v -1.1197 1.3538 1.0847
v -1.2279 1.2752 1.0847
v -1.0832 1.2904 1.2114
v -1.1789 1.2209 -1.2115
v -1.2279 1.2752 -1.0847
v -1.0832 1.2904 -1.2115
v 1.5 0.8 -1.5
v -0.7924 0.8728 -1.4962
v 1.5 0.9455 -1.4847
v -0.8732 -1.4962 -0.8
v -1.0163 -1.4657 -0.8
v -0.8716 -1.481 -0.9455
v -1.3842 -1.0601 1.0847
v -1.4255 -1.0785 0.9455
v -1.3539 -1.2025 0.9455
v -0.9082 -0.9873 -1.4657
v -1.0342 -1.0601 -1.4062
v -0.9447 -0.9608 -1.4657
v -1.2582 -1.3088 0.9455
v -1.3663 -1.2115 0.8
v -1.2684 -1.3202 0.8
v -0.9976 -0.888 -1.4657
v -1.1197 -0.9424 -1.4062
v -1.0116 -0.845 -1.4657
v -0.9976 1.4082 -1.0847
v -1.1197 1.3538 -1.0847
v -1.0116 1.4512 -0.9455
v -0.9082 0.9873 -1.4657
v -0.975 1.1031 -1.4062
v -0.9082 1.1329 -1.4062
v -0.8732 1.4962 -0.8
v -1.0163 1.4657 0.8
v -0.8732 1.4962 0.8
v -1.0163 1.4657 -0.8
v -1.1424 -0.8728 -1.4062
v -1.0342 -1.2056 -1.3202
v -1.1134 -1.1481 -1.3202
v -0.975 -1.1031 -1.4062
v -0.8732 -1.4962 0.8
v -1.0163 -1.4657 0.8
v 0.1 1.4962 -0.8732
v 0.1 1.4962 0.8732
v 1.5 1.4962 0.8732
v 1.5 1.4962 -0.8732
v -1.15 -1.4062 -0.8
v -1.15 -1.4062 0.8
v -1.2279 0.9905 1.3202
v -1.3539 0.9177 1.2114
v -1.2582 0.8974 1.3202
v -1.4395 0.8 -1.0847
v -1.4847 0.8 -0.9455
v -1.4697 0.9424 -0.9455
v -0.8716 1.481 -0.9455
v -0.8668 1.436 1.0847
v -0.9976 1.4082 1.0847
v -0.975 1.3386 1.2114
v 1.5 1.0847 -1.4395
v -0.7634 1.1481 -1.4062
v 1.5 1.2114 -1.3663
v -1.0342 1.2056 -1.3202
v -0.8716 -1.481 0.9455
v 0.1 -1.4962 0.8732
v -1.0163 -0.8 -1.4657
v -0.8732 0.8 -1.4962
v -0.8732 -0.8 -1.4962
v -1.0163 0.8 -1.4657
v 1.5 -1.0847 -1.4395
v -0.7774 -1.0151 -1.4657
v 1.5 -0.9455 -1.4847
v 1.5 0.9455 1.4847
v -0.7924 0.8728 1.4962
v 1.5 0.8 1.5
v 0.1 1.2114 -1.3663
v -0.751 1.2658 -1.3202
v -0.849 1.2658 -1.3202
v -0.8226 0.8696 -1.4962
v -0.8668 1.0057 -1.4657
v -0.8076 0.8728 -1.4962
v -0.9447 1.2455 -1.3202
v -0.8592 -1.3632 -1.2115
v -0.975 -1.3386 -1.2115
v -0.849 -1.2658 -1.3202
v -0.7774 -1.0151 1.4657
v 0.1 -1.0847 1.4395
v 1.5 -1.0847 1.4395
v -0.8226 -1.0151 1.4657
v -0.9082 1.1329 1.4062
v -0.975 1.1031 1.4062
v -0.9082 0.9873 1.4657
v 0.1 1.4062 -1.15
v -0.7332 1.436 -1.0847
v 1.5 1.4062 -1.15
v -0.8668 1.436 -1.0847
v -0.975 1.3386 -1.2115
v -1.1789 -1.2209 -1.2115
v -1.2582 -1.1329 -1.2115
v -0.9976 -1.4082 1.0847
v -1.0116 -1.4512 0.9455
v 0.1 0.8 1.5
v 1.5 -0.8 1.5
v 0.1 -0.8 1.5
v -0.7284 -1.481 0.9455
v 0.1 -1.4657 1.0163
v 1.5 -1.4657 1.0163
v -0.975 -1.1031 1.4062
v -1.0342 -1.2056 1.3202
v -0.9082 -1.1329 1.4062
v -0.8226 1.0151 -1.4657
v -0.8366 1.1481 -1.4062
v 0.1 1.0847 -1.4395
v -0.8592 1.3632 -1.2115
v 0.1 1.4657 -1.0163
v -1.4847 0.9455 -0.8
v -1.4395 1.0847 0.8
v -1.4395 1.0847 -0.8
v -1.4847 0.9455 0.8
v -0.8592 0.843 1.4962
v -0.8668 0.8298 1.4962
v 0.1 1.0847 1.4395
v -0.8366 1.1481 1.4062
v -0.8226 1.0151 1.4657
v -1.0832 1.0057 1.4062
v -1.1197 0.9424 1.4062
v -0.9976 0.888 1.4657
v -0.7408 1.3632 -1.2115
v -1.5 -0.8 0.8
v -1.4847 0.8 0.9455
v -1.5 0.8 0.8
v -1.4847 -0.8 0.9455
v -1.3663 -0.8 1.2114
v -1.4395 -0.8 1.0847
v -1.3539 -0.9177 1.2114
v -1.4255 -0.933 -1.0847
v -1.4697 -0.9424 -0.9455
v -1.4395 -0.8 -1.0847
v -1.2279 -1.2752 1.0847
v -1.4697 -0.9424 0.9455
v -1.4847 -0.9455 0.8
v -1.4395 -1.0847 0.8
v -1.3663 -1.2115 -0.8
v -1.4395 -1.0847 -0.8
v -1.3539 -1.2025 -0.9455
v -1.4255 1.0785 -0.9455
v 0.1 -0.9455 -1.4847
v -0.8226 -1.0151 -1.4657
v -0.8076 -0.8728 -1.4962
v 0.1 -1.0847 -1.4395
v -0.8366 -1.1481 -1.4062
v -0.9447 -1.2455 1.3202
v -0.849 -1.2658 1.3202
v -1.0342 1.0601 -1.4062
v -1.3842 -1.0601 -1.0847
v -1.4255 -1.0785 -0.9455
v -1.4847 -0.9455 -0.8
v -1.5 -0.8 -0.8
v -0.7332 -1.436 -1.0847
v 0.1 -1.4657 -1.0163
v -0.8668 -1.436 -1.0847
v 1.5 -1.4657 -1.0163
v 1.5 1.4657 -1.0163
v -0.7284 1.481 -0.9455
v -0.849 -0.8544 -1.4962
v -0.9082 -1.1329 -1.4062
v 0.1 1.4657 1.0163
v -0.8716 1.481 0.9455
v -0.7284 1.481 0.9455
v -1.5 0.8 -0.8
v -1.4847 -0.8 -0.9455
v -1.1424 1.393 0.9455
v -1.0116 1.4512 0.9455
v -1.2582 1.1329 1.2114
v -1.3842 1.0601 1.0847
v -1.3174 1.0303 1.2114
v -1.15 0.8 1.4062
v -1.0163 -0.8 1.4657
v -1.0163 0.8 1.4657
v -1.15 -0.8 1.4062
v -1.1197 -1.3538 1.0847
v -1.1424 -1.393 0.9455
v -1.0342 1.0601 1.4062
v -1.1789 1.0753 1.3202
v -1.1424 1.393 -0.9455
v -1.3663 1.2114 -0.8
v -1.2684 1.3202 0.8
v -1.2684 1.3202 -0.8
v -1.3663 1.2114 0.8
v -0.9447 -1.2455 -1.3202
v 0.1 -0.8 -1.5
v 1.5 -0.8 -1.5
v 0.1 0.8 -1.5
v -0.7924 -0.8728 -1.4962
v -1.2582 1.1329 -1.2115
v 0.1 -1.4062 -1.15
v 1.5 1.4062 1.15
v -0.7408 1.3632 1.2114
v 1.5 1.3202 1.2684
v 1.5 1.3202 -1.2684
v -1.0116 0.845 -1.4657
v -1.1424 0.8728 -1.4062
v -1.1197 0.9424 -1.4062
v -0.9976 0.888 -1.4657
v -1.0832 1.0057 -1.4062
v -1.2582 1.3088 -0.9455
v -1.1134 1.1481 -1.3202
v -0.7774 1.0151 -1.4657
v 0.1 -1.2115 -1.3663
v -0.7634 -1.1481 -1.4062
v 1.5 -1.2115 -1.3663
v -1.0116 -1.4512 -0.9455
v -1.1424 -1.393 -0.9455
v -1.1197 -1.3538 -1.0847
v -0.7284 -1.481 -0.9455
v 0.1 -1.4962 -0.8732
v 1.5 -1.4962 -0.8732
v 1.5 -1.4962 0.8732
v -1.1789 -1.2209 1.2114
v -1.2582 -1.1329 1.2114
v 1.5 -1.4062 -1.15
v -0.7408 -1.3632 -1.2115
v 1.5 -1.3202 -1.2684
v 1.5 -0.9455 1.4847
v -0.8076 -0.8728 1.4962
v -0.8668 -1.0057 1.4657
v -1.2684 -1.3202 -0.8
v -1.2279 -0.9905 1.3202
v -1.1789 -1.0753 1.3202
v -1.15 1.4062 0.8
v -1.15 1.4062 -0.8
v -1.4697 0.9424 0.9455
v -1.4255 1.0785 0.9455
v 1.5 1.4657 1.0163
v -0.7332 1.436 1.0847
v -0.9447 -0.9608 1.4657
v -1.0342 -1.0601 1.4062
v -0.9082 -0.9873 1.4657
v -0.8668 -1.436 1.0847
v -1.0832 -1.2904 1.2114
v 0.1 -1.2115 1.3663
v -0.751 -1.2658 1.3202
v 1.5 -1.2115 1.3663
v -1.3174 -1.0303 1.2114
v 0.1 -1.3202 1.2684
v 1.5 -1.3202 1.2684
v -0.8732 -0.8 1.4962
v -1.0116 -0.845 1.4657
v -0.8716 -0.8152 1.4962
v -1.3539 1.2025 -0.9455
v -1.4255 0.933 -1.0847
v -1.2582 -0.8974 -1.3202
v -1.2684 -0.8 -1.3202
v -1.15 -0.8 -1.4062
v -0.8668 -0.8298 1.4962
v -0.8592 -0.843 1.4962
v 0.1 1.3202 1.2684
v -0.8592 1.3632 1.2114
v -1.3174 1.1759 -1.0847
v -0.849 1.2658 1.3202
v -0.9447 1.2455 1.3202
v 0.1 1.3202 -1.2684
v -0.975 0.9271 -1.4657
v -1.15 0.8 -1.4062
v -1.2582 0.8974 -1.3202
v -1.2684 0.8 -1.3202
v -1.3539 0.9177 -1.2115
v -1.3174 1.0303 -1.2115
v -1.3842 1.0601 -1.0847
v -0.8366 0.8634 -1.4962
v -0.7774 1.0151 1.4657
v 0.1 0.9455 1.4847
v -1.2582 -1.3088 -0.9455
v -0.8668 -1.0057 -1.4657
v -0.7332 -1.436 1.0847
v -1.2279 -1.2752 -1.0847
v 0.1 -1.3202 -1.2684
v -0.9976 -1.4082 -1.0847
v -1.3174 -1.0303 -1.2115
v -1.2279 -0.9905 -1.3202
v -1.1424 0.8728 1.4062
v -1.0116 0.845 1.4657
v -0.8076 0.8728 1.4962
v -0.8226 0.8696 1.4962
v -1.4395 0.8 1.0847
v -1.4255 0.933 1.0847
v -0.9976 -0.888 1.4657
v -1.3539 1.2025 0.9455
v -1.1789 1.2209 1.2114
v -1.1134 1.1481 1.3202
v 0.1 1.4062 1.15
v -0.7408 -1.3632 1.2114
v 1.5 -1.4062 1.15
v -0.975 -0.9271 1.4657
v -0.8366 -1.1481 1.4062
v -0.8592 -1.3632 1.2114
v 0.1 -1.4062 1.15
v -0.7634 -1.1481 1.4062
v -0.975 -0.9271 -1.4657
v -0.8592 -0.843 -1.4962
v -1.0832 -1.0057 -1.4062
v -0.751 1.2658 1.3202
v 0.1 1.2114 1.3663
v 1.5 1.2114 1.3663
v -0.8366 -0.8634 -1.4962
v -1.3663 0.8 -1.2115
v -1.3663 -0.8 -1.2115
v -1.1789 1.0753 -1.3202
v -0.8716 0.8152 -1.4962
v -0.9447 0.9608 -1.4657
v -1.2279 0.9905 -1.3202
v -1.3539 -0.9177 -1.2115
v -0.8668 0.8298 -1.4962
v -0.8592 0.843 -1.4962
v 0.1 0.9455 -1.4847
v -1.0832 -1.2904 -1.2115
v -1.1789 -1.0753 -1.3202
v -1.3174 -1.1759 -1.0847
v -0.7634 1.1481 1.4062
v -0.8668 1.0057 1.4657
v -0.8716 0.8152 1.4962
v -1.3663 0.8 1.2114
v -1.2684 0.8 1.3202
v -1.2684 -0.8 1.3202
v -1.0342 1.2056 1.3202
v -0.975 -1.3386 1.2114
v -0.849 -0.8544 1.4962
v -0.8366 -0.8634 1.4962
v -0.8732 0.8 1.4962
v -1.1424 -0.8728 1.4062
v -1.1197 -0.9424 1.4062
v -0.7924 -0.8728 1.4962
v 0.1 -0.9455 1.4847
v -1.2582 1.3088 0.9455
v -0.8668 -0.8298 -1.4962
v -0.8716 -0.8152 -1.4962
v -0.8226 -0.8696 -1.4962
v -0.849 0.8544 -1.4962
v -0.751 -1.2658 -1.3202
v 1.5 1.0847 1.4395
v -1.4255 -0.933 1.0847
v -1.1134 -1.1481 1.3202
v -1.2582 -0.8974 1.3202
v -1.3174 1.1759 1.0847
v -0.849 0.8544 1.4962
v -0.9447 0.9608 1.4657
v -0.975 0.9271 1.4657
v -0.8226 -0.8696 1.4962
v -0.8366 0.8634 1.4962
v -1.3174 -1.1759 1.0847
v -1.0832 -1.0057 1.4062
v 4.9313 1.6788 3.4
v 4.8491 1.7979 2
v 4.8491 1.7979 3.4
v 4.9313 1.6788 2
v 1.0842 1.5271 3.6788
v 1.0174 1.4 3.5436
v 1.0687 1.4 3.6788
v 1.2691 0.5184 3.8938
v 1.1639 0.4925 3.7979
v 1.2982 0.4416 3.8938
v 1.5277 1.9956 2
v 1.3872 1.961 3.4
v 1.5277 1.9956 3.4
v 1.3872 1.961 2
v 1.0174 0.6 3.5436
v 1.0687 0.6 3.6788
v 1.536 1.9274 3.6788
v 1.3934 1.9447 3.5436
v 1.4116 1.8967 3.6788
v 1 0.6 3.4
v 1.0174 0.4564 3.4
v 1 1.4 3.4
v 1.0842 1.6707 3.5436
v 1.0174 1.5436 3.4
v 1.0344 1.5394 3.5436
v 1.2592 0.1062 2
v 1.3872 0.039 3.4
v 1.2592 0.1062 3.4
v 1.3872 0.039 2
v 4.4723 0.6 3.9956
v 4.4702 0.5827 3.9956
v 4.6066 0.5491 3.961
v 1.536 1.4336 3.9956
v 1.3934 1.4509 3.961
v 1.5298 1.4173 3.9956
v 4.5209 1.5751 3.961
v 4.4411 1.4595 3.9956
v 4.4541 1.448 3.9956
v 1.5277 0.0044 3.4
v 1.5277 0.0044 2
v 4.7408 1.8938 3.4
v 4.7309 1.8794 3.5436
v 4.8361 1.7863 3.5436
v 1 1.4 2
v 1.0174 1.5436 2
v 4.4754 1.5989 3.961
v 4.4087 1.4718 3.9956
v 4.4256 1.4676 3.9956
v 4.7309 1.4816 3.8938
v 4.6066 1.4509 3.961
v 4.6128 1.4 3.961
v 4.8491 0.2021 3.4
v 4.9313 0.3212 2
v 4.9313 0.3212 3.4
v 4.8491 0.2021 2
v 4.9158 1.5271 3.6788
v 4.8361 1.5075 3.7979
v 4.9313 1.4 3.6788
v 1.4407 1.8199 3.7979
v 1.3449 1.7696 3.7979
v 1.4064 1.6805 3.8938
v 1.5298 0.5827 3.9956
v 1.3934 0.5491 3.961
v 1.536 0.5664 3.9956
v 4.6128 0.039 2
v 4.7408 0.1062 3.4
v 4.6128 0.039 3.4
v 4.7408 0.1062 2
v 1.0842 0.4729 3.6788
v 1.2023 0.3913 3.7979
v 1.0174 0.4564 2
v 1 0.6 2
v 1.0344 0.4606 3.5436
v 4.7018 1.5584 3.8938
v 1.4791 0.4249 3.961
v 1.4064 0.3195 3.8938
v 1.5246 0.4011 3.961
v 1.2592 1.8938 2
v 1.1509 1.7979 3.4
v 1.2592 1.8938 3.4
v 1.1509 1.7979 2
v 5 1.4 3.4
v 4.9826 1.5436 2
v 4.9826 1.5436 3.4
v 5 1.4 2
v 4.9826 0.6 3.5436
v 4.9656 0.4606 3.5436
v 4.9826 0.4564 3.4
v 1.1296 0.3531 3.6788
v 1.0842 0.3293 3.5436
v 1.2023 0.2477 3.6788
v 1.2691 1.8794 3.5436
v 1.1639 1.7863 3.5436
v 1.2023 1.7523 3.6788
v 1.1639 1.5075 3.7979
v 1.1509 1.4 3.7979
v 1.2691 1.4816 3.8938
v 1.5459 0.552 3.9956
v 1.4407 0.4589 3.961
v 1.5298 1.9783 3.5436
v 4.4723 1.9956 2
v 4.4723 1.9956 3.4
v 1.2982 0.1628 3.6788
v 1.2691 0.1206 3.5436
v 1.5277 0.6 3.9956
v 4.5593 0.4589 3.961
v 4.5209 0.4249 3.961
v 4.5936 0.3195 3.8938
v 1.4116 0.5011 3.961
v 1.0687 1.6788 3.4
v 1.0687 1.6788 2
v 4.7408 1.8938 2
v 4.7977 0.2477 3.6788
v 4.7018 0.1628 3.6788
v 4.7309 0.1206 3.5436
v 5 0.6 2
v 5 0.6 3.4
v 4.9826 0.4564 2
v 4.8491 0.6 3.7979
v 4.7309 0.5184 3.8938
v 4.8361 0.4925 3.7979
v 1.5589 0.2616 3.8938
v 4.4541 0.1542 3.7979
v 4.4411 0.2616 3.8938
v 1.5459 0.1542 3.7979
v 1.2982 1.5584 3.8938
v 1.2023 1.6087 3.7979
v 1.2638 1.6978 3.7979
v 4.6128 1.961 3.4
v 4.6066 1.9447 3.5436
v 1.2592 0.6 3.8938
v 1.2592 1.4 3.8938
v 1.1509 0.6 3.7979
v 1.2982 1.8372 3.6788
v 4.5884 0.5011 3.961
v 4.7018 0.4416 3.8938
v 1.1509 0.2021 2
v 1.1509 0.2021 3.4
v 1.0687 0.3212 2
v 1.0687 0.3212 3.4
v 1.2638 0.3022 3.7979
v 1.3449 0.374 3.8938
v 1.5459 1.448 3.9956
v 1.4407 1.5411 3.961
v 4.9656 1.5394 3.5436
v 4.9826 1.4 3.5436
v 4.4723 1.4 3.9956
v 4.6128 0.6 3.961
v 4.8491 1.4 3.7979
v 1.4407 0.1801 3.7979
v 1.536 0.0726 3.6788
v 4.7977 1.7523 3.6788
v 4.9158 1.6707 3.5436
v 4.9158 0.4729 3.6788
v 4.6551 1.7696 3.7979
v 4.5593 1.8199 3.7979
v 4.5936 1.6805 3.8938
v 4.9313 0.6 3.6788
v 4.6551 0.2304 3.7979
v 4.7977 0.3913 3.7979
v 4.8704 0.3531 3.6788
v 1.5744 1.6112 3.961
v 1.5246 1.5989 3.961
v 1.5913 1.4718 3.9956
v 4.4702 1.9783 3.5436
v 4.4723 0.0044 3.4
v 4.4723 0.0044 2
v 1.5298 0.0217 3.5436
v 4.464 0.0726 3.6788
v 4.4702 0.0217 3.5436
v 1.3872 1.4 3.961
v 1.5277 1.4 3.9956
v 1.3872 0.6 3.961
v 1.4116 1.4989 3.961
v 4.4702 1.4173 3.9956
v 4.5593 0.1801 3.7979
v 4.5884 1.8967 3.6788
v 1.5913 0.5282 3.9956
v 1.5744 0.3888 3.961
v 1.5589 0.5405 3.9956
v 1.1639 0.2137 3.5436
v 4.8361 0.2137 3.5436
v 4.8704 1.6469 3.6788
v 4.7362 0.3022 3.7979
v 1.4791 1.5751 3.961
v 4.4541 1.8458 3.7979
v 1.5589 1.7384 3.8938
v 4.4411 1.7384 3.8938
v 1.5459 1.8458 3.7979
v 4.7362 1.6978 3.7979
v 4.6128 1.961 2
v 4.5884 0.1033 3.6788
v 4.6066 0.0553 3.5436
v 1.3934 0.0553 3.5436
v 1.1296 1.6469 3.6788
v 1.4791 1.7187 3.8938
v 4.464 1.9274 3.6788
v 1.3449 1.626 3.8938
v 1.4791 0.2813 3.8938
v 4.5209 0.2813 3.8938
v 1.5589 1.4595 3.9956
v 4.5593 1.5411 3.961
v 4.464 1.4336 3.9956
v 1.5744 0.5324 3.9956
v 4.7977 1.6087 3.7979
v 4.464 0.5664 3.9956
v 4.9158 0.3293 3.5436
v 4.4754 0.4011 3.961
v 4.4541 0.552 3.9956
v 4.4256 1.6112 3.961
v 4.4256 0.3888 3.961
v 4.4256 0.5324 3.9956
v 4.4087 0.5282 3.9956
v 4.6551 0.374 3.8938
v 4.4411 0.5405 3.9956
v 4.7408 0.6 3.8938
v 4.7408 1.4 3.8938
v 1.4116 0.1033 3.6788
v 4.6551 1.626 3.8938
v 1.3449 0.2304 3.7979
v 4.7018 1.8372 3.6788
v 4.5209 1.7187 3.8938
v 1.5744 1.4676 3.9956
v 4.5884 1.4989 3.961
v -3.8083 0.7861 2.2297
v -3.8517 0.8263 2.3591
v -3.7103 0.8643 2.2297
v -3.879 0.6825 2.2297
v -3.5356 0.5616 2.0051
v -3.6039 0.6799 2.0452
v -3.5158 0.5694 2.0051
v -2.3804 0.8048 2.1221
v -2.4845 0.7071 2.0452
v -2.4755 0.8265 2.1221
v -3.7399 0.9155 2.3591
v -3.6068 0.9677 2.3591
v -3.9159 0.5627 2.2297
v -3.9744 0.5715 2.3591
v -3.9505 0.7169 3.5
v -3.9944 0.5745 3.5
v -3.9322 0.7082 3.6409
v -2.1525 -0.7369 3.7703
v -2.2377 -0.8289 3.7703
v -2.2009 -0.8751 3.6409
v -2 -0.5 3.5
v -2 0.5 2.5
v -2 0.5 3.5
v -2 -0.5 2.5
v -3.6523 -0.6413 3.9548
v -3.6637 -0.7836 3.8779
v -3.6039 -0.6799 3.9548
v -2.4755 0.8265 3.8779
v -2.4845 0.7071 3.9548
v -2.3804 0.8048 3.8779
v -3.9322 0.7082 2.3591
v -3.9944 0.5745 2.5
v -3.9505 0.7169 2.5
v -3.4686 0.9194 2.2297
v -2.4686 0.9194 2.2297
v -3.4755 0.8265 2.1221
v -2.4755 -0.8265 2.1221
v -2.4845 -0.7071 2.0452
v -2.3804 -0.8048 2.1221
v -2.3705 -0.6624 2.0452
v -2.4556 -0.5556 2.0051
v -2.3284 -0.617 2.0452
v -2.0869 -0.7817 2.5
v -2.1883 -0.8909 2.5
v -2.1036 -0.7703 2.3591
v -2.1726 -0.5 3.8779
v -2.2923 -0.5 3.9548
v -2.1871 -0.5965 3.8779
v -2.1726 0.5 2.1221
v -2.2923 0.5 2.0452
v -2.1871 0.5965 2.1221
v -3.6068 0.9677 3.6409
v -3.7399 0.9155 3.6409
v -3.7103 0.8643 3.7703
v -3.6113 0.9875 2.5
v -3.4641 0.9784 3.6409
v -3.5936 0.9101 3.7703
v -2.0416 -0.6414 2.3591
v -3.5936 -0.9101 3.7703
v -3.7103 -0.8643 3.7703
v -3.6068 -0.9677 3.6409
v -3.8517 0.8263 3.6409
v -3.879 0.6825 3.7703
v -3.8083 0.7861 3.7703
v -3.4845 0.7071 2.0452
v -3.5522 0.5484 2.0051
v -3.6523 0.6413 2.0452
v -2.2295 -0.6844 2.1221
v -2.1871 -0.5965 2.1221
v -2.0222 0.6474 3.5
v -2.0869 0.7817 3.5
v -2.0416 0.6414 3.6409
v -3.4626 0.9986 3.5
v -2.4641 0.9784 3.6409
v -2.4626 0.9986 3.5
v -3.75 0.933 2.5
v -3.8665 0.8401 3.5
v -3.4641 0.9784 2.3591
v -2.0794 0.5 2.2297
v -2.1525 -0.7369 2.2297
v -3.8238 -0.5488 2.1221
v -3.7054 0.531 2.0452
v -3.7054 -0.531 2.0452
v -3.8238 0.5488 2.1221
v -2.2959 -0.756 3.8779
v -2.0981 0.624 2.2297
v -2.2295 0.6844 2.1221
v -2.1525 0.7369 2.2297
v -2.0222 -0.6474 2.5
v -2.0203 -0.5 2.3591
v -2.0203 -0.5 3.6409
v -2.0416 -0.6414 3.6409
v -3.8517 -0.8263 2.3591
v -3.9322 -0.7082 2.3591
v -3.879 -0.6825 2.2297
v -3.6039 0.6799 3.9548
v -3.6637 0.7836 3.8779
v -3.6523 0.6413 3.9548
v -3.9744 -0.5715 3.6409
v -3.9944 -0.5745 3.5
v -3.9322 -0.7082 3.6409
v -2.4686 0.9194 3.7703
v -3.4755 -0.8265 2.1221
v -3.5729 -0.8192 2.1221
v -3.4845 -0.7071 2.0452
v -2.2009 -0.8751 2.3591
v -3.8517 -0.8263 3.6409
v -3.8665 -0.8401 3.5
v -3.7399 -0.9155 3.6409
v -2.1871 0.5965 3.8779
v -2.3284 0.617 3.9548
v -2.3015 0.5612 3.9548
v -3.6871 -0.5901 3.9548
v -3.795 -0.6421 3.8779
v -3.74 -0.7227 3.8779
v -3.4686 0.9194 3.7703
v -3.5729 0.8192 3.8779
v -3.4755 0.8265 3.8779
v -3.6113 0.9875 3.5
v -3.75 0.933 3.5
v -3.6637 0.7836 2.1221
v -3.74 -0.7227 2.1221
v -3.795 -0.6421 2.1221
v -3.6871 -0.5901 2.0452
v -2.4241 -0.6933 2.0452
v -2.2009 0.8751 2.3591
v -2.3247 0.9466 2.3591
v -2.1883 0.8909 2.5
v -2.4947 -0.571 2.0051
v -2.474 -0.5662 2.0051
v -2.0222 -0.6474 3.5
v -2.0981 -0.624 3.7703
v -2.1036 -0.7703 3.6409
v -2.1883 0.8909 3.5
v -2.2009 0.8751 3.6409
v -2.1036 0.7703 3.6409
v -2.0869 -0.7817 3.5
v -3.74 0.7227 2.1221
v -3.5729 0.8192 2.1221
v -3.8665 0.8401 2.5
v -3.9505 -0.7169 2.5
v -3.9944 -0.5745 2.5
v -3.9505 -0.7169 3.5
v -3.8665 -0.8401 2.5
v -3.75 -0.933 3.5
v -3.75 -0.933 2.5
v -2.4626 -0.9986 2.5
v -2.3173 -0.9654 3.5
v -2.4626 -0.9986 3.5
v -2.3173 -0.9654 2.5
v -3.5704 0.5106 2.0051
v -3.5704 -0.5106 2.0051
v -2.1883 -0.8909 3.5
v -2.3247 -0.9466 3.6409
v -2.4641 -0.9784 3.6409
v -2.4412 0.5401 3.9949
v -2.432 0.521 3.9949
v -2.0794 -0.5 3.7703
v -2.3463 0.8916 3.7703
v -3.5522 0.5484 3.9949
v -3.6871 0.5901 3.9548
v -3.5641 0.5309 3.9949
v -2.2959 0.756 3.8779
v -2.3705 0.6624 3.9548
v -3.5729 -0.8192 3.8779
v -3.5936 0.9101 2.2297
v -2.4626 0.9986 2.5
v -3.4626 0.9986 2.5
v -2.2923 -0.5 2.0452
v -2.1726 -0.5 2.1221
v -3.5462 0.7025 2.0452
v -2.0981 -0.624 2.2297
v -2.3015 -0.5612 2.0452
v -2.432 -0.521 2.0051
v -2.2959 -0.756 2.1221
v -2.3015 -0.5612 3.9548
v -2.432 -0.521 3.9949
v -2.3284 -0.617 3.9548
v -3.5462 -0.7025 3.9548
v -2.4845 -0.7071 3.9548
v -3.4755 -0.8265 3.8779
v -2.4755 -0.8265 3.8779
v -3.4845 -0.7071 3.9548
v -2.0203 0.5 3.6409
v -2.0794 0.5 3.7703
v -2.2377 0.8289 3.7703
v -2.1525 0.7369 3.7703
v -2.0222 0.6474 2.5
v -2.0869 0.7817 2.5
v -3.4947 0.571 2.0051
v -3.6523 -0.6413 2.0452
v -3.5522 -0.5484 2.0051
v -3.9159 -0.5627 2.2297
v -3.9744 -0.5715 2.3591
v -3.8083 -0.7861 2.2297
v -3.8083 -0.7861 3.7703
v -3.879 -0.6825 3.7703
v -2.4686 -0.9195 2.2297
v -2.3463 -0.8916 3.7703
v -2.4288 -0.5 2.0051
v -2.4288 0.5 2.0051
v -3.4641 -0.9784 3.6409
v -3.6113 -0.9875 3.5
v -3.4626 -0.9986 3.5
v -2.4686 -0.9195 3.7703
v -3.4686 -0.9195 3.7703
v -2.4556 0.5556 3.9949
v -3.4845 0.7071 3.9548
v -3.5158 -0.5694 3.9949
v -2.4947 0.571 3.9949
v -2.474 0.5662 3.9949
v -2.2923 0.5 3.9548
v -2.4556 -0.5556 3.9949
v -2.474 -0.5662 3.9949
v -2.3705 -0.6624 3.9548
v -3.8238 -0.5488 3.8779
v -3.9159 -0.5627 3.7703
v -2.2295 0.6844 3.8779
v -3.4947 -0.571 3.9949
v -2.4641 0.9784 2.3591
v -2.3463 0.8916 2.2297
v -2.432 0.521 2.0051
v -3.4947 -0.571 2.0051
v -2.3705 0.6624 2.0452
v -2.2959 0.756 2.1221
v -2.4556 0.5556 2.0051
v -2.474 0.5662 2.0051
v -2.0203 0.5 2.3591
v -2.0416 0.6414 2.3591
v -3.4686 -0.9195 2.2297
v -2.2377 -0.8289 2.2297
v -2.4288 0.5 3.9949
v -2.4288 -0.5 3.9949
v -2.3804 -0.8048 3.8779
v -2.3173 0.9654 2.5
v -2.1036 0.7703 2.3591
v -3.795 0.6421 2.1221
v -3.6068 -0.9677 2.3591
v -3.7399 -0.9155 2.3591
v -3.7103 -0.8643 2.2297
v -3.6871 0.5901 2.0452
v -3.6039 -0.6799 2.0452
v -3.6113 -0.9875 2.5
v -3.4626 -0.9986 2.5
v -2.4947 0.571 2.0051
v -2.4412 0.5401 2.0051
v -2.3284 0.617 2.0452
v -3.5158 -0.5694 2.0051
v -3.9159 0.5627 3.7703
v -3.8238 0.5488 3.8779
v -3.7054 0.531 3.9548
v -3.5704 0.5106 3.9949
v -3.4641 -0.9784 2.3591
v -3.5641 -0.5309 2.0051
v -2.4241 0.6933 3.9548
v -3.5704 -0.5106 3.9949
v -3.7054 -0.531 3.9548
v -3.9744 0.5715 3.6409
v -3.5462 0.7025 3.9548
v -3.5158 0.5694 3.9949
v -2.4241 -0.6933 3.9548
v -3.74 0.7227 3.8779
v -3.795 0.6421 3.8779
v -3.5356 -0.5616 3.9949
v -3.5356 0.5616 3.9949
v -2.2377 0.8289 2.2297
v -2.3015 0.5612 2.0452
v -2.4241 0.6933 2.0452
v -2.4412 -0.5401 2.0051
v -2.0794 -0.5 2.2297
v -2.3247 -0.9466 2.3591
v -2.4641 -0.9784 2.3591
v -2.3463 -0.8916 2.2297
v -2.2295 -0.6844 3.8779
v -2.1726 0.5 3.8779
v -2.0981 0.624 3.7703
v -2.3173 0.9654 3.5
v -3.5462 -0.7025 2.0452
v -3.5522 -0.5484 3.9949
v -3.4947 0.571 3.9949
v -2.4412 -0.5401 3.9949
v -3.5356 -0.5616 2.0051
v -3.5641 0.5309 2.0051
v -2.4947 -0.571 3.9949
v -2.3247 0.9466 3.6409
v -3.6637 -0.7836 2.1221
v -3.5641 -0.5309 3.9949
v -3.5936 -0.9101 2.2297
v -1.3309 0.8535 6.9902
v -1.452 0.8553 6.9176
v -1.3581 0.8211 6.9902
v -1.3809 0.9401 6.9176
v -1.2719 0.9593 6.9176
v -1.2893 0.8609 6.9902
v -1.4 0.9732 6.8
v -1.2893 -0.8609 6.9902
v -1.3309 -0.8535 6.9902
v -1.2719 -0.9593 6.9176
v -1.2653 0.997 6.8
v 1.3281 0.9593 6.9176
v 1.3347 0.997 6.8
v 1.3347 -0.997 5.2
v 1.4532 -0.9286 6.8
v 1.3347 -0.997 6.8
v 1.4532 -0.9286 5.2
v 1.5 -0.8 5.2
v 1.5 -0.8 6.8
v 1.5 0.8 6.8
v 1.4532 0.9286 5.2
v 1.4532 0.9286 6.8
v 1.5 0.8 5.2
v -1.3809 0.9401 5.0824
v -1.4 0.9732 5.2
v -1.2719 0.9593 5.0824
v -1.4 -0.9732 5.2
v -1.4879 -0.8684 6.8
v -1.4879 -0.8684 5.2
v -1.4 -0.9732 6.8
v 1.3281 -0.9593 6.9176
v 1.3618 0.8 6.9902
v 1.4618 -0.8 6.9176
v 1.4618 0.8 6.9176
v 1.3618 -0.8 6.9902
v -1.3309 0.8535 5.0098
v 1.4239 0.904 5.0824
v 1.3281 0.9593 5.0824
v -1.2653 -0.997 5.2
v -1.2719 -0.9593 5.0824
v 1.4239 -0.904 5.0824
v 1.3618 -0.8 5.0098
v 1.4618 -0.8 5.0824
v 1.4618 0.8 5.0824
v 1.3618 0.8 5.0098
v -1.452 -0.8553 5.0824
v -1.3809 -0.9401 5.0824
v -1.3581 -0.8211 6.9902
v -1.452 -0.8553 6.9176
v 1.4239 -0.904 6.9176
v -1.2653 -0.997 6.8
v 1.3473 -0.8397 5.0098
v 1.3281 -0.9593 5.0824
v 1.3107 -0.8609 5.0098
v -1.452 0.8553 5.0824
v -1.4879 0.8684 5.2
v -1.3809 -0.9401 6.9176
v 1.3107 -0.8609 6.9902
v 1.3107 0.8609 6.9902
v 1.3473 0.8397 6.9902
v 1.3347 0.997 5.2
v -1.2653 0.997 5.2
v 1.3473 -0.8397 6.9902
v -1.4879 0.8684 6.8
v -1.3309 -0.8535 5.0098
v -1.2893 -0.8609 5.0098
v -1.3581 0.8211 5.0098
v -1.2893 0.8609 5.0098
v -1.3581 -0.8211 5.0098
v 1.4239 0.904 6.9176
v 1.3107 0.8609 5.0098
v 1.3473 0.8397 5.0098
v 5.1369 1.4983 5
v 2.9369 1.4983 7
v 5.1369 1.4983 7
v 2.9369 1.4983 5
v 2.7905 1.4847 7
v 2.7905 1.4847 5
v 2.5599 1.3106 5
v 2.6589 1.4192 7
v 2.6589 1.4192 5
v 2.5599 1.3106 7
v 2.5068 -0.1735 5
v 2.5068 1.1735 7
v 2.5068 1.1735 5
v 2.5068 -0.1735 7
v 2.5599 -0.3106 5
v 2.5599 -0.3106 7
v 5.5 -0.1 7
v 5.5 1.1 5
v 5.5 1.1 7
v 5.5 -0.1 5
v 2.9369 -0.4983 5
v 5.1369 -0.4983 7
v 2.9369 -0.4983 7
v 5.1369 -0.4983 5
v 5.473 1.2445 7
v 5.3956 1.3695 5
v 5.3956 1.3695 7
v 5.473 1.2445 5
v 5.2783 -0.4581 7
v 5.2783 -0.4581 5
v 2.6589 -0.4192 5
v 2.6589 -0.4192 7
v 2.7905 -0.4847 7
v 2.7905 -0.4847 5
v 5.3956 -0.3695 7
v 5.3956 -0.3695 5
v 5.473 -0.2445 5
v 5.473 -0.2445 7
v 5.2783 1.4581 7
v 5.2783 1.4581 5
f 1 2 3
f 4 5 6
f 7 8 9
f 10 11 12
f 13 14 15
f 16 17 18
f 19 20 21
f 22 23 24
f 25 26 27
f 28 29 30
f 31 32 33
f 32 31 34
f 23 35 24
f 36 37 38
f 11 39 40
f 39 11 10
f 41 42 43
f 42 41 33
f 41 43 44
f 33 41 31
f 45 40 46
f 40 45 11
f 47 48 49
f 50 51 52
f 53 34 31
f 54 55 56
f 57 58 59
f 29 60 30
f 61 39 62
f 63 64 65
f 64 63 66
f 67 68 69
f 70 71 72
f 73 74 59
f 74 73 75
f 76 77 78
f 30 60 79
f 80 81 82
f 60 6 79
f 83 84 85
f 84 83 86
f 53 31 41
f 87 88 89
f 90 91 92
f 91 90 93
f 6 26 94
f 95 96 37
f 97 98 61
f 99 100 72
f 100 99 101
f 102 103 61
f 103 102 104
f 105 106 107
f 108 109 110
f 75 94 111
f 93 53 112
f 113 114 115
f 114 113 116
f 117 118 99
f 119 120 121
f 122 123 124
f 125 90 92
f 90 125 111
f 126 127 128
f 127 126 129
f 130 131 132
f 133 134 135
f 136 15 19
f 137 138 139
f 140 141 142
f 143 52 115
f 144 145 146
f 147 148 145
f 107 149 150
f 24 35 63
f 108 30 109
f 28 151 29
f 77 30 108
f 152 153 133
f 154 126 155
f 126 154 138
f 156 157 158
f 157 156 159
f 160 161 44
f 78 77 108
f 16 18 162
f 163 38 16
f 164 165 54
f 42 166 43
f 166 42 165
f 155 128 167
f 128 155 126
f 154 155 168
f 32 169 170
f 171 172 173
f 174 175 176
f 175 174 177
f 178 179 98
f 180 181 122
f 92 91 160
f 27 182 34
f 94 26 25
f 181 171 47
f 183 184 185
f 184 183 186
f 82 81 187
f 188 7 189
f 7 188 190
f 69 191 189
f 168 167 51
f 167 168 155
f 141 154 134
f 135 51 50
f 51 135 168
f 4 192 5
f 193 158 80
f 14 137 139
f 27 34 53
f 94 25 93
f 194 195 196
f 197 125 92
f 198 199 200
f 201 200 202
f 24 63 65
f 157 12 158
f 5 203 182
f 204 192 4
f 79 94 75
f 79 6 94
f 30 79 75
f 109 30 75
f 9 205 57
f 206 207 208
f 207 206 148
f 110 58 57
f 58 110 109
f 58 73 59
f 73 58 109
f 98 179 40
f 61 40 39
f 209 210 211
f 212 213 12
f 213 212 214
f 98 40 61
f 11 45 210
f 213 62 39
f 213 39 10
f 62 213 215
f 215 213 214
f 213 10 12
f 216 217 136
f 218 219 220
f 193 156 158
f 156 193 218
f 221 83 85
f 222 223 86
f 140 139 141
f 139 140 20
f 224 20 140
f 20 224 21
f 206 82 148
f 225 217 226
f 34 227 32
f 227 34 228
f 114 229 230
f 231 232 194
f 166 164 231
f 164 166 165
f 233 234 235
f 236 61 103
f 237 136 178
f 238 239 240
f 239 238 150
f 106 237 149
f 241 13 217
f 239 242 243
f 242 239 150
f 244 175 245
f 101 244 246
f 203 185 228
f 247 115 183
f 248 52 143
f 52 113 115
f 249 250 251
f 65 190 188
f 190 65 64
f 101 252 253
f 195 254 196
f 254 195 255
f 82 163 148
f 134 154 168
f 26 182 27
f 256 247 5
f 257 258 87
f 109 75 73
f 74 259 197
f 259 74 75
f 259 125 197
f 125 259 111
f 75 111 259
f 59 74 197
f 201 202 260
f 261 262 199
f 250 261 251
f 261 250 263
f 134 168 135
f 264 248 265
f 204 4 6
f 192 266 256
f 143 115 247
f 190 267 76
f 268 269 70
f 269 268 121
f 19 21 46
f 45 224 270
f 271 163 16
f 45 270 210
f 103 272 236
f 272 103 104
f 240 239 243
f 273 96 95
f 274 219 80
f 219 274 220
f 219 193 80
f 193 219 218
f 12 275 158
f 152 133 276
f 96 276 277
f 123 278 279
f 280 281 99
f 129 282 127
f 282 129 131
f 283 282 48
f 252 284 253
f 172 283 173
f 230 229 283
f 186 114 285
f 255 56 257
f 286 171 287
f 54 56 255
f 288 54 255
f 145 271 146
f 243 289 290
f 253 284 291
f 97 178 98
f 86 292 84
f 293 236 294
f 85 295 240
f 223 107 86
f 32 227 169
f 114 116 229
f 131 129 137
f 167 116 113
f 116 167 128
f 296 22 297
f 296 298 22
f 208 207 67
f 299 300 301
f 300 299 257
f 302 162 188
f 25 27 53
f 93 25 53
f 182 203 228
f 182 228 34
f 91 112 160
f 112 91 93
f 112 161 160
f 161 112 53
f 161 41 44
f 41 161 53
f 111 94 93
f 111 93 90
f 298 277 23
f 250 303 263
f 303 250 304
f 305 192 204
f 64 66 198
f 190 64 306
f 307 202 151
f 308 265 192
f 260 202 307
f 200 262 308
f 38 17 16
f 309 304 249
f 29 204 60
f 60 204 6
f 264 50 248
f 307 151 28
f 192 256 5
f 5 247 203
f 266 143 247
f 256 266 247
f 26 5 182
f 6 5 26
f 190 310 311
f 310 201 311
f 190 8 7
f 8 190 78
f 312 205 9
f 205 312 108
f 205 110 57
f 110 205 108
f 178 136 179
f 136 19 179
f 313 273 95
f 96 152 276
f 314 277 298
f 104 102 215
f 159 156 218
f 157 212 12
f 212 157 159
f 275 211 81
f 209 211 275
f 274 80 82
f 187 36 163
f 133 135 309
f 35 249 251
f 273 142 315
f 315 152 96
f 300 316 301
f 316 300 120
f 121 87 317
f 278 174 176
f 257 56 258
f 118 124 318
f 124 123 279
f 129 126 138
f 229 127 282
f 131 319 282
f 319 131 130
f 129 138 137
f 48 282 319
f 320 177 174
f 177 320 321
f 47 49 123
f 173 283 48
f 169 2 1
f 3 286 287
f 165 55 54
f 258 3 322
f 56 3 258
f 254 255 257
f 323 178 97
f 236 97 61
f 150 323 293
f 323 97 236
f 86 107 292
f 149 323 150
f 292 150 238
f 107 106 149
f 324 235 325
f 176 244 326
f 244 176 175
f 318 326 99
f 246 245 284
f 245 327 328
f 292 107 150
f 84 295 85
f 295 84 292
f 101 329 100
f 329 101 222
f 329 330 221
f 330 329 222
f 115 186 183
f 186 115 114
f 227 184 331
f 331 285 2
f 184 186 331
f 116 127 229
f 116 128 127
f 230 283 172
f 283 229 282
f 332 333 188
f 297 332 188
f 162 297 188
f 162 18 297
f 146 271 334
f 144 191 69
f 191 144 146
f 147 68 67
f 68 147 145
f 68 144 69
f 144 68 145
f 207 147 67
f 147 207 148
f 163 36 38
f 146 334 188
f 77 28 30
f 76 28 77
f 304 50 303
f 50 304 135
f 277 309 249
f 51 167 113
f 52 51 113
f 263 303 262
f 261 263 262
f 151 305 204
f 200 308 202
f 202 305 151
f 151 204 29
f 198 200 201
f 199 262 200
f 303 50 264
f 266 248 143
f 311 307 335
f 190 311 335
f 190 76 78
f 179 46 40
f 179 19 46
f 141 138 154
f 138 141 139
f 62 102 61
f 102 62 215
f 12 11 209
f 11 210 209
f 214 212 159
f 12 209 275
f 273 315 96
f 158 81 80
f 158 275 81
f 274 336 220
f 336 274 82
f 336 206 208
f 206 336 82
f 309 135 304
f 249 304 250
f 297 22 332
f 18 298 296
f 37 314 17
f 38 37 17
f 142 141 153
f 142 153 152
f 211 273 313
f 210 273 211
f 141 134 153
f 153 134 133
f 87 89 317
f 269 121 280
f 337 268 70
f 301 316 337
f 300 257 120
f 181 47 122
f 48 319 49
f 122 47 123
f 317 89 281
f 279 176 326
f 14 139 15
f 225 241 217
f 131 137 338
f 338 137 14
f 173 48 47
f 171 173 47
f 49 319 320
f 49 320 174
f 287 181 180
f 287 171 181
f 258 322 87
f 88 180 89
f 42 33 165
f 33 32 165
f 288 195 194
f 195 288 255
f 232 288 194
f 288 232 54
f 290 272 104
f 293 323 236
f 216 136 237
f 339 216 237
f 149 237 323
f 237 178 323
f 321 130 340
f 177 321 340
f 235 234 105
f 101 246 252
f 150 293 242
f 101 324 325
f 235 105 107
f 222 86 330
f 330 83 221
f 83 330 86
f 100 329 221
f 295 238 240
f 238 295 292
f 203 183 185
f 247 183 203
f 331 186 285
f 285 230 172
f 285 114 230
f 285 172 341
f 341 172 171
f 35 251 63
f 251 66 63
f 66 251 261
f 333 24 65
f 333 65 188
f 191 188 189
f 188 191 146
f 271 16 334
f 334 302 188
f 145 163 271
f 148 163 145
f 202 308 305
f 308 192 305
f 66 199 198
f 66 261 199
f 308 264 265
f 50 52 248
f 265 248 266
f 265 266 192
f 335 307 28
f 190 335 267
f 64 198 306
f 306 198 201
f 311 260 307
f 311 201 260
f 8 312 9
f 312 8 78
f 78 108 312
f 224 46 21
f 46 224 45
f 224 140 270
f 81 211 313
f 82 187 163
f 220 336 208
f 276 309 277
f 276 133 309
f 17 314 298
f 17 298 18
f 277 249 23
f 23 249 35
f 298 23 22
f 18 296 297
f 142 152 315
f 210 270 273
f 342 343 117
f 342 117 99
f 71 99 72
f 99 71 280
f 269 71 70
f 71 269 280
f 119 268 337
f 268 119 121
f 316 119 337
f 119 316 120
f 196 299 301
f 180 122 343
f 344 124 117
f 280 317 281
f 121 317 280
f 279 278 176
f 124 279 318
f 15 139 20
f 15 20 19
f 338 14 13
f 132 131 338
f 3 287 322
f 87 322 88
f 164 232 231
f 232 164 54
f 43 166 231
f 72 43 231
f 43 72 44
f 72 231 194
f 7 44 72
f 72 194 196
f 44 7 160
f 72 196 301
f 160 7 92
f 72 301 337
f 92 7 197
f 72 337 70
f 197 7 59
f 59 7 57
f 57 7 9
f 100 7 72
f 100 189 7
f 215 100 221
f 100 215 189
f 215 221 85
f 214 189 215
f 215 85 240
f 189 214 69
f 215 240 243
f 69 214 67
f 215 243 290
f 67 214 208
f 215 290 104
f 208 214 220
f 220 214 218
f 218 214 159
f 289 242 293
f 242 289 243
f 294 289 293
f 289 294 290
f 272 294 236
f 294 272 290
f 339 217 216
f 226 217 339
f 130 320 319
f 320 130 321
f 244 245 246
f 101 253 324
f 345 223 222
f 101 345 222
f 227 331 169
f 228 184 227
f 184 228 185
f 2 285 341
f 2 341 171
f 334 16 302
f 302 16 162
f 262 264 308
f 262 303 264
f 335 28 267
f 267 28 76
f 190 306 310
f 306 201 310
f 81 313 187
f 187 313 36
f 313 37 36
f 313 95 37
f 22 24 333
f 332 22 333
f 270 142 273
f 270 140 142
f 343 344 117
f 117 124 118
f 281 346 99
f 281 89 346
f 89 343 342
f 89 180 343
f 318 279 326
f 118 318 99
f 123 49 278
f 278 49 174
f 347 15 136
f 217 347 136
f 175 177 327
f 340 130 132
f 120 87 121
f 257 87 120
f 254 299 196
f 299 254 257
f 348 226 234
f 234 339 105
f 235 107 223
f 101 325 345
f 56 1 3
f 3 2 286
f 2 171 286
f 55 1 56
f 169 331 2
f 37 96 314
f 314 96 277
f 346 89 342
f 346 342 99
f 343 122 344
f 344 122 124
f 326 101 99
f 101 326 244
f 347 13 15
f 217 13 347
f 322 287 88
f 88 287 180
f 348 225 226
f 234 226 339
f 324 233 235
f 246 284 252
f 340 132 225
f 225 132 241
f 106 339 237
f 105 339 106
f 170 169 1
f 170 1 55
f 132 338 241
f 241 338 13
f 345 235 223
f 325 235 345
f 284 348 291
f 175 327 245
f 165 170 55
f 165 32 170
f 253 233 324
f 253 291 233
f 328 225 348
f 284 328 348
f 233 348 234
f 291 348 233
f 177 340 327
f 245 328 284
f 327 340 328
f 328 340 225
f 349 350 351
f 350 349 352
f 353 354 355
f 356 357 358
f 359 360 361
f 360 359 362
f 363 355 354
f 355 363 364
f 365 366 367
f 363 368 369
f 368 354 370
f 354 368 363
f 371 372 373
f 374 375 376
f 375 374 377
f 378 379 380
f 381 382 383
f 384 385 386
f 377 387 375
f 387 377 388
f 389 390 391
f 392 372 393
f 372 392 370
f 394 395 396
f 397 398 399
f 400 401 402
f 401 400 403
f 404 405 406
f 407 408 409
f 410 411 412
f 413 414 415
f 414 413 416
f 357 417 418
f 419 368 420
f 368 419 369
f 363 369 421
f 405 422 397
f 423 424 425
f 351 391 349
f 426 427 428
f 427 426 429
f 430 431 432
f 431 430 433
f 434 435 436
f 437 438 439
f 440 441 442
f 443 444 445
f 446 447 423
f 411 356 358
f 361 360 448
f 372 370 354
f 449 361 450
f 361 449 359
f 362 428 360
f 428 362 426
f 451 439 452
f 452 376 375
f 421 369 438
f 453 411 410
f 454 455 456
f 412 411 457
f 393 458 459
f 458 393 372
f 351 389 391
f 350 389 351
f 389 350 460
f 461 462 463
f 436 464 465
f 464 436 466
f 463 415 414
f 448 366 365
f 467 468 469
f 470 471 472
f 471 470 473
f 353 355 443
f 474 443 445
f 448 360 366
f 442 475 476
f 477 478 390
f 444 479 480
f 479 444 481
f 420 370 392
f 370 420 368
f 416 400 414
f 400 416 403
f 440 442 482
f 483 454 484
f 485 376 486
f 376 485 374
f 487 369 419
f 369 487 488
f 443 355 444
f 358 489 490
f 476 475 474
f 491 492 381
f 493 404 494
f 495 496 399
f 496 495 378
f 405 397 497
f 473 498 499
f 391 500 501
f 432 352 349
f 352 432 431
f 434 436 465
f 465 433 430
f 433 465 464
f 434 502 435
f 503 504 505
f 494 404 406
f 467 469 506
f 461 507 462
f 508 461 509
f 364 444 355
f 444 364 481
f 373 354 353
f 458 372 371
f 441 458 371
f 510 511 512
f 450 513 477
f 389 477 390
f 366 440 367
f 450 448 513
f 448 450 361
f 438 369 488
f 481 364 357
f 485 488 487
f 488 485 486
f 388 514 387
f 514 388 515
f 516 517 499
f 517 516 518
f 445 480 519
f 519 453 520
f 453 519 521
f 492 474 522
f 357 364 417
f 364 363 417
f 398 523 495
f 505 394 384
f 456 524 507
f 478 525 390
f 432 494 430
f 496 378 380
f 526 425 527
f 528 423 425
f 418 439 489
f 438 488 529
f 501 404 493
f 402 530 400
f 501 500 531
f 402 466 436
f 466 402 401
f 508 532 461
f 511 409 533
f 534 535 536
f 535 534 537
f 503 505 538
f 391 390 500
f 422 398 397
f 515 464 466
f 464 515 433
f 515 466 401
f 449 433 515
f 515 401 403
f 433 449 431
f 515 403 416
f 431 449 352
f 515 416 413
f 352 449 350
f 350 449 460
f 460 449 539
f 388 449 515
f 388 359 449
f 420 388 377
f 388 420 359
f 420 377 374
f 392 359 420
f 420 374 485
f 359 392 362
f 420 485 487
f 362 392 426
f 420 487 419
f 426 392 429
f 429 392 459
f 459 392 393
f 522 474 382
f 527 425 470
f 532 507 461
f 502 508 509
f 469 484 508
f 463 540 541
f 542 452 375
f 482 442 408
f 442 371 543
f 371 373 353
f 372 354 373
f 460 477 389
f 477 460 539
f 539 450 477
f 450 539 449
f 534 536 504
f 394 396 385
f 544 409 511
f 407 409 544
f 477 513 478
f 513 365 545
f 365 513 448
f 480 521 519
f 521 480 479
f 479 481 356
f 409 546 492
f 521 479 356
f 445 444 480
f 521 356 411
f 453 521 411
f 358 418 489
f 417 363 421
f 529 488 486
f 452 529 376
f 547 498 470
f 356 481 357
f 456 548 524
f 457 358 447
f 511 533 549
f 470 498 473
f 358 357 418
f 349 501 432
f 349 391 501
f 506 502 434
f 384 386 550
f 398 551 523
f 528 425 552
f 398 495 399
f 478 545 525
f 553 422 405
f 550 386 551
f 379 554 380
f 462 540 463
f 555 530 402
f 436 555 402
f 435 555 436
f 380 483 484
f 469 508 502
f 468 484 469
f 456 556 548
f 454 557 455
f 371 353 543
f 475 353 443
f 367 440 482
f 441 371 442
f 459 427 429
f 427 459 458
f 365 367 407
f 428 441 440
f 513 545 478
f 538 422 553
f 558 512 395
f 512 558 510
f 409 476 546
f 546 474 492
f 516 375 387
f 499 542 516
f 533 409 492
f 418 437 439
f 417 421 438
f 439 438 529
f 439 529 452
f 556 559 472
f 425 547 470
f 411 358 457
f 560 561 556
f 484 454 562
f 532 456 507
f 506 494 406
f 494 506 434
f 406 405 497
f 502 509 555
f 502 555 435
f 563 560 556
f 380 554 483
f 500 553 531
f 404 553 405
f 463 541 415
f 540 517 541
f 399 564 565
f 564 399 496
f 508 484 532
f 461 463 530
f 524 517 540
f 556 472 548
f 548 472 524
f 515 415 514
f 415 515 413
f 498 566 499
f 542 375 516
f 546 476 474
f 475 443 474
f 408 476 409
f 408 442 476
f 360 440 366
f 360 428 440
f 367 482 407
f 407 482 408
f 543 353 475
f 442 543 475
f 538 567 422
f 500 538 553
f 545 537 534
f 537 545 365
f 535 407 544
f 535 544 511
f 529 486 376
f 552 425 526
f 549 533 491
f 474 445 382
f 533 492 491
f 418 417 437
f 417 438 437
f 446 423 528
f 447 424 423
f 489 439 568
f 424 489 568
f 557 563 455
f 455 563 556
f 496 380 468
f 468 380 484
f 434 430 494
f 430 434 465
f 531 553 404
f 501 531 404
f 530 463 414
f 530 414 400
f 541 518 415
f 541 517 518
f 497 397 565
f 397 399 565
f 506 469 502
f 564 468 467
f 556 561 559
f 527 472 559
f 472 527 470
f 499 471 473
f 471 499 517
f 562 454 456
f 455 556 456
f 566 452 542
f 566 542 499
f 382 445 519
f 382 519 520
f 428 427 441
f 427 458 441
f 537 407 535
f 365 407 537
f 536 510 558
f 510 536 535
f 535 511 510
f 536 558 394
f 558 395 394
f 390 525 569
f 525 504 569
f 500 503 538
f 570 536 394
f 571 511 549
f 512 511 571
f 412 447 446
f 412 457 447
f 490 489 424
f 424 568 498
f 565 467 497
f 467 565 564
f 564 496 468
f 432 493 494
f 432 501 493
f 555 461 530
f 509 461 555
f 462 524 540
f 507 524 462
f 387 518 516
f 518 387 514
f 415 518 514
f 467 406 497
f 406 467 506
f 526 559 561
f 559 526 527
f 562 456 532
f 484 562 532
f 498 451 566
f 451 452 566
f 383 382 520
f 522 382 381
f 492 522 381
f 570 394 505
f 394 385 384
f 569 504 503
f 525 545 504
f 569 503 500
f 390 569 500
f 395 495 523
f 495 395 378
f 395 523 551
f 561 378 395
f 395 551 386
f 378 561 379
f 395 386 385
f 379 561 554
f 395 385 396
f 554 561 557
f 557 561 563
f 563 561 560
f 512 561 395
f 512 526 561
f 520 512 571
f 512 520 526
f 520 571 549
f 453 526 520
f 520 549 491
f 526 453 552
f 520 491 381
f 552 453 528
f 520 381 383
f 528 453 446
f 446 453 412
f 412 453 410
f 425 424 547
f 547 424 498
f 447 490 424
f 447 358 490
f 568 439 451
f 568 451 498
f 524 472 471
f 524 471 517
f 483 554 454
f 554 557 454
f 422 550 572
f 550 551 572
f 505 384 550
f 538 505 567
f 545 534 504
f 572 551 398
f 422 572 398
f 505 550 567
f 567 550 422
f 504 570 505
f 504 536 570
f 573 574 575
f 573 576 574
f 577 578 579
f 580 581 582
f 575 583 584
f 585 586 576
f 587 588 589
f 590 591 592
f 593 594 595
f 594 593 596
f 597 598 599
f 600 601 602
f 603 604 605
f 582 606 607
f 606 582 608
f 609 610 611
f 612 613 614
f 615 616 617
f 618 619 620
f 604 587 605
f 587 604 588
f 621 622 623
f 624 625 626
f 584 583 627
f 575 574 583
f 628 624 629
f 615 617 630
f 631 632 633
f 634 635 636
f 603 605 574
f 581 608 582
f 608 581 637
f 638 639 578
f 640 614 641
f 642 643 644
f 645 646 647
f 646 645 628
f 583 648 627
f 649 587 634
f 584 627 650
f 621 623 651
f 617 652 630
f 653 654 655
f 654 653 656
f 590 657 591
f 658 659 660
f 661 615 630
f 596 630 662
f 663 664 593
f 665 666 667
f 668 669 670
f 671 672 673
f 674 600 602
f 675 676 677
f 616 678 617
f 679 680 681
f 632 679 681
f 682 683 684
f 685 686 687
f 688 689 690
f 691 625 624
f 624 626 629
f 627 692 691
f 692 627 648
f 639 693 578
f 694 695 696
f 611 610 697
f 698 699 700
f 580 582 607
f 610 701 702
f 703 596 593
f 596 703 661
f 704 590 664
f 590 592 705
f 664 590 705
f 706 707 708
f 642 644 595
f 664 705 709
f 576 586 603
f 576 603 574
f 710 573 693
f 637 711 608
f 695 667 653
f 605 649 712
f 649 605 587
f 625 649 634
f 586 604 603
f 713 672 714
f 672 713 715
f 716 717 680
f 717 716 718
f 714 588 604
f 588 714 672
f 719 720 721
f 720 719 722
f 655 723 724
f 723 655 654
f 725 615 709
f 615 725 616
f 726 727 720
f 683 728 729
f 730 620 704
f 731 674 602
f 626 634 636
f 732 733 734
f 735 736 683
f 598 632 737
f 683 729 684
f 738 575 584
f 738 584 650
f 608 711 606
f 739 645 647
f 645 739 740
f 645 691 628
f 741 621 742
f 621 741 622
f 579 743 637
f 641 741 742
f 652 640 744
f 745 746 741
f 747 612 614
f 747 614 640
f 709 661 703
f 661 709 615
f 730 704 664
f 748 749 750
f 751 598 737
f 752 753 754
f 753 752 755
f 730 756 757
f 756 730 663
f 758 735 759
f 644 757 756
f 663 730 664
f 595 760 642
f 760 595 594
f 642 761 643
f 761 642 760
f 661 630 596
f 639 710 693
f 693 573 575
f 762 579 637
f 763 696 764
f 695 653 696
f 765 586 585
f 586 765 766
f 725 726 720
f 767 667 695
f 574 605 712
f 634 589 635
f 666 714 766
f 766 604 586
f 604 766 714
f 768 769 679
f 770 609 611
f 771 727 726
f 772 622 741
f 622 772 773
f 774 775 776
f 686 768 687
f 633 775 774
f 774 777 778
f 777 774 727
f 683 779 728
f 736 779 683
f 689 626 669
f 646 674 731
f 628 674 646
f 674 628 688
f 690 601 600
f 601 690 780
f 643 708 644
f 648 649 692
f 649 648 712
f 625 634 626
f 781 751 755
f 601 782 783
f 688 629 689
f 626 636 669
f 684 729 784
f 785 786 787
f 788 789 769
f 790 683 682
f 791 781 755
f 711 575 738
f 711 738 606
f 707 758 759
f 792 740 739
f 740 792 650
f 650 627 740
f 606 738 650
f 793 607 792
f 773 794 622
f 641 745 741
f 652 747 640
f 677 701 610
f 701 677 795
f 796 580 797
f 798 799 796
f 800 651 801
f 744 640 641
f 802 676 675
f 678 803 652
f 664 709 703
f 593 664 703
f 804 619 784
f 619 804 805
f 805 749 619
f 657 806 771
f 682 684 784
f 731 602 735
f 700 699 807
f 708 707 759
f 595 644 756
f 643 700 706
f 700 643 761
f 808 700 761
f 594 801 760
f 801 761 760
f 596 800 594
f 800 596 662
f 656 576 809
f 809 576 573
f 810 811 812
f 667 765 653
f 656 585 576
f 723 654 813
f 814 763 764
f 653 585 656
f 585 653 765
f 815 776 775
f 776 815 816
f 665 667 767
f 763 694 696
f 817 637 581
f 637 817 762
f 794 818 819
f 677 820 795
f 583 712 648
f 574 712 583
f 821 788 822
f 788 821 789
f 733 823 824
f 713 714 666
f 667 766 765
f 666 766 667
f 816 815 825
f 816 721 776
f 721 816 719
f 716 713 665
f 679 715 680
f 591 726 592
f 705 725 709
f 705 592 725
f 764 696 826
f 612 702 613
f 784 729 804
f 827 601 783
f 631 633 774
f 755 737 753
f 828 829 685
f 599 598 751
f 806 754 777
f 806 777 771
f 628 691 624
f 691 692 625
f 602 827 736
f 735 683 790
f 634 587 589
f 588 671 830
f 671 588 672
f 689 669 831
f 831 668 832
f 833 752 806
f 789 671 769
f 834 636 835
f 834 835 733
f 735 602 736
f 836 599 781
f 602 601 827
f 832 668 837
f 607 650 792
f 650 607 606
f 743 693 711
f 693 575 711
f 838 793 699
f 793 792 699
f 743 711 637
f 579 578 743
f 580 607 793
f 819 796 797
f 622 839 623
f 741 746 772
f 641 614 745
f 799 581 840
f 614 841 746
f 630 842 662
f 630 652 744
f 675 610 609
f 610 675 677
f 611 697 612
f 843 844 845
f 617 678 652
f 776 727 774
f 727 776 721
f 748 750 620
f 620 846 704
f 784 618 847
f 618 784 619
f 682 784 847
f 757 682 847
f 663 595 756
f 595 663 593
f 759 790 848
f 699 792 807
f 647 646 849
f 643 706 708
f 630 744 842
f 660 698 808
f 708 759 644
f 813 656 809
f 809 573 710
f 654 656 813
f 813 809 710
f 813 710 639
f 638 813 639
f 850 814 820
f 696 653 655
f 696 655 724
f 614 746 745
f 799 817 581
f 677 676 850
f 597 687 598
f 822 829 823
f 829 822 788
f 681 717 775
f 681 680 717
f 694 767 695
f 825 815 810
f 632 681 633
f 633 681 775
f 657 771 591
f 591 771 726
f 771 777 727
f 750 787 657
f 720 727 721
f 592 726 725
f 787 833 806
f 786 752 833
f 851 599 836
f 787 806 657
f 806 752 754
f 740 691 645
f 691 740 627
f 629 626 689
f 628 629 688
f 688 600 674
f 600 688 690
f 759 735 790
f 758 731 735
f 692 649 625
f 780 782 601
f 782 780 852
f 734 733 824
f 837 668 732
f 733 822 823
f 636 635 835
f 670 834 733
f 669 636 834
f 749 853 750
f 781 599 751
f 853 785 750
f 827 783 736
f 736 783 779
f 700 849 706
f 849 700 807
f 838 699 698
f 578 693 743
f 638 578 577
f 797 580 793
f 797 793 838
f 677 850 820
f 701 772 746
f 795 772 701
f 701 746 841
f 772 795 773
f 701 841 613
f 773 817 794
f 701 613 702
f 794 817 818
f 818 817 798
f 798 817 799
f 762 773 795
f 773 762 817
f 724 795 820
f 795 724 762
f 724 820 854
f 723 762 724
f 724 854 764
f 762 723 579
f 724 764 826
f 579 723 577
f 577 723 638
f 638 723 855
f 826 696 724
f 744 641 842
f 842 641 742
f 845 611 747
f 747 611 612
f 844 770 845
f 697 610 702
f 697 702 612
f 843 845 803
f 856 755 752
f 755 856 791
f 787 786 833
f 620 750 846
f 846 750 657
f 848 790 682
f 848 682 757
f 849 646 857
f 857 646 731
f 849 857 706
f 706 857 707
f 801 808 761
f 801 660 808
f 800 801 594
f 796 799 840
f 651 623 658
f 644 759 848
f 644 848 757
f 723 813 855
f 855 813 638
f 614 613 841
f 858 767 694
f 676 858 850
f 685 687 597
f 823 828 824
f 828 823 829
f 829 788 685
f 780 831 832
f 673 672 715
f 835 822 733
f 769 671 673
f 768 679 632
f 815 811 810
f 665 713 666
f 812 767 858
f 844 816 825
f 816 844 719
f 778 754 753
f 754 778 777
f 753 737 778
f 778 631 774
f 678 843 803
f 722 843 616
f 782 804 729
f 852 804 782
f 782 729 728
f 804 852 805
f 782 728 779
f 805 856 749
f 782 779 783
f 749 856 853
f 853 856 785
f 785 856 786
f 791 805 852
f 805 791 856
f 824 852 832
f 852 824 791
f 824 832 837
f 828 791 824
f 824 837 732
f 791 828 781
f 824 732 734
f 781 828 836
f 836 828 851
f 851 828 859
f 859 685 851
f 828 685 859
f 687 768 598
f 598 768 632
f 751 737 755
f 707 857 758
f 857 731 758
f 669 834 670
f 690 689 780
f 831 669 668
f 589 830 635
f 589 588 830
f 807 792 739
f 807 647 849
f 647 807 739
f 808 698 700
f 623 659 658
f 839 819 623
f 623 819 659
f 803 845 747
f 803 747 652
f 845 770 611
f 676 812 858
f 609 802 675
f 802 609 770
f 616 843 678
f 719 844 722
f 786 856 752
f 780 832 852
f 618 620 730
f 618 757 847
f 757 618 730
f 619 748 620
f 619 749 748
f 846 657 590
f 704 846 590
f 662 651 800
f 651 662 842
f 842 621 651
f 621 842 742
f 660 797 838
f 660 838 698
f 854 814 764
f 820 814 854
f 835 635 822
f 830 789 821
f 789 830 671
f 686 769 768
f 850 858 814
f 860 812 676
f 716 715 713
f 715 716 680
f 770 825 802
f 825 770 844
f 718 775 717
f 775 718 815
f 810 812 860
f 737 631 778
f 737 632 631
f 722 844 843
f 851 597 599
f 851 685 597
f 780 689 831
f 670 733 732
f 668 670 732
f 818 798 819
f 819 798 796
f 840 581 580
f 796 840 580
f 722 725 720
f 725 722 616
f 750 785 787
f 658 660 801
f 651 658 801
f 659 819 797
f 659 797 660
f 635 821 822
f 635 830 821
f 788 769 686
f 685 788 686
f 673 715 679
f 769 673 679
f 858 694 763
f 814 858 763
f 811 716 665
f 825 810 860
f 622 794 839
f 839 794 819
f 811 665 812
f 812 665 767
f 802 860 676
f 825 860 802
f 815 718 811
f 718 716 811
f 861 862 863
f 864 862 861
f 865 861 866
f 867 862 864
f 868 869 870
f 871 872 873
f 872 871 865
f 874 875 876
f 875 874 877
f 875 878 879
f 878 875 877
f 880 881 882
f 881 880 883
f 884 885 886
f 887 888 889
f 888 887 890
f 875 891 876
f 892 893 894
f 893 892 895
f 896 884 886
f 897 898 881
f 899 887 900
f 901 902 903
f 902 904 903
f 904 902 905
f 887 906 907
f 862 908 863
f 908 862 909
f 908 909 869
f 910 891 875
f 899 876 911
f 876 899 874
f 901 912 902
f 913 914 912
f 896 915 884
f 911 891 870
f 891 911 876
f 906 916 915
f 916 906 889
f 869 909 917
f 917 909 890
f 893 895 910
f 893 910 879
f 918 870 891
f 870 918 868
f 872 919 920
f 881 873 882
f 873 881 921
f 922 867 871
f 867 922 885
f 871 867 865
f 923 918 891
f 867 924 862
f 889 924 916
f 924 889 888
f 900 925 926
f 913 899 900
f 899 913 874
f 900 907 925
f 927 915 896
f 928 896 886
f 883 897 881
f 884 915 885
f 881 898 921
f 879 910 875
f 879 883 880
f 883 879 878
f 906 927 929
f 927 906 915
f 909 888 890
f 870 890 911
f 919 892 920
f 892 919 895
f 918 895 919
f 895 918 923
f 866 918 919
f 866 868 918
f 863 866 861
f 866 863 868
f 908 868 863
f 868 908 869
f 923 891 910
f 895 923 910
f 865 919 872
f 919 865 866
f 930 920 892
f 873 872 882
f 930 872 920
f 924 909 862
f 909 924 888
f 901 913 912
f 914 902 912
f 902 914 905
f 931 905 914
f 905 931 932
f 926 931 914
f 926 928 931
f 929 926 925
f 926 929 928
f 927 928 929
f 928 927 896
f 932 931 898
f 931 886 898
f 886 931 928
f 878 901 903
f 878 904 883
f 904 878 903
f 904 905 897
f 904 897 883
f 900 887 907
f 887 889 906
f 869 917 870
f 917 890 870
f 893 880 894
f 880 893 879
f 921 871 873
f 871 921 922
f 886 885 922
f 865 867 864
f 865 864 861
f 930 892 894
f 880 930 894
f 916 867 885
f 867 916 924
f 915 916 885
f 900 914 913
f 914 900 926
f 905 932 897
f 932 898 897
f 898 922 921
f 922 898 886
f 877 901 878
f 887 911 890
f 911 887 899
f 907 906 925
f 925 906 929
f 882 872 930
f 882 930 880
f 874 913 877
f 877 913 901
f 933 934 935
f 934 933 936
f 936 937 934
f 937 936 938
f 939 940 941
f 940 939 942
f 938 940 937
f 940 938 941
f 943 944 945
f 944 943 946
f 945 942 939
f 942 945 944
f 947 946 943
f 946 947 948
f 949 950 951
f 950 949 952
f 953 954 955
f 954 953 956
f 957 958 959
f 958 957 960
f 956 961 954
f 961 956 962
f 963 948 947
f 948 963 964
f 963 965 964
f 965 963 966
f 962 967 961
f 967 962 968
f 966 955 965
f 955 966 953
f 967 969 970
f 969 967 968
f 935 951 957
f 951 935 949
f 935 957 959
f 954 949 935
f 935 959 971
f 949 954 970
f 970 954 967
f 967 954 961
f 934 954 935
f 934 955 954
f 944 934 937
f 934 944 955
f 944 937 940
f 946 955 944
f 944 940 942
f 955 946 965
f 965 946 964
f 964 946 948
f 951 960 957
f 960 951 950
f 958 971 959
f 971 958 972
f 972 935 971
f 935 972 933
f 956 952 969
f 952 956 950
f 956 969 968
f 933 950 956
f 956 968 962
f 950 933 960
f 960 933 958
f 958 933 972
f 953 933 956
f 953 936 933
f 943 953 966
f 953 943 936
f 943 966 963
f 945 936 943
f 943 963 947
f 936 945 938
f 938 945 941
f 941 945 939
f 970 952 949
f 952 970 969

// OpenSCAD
// More information: https://danielupshaw.com/openscad-rounded-corners/

// Set to 0.01 for higher definition curves (renders slower)
$fs = 0.15;

module roundedcube(size = [1, 1, 1], center = false, radius = 0.5, apply_to = "all") {
	// If single value, convert to [x, y, z] vector
	size = (size[0] == undef) ? [size, size, size] : size;

	translate_min = radius;
	translate_xmax = size[0] - radius;
	translate_ymax = size[1] - radius;
	translate_zmax = size[2] - radius;

	diameter = radius * 2;

	obj_translate = (center == false) ?
		[0, 0, 0] : [
			-(size[0] / 2),
			-(size[1] / 2),
			-(size[2] / 2)
		];

	translate(v = obj_translate) {
		hull() {
			for (translate_x = [translate_min, translate_xmax]) {
				x_at = (translate_x == translate_min) ? "min" : "max";
				for (translate_y = [translate_min, translate_ymax]) {
					y_at = (translate_y == translate_min) ? "min" : "max";
					for (translate_z = [translate_min, translate_zmax]) {
						z_at = (translate_z == translate_min) ? "min" : "max";

						translate(v = [translate_x, translate_y, translate_z])
						if (
							(apply_to == "all") ||
							(apply_to == "xmin" && x_at == "min") || (apply_to == "xmax" && x_at == "max") ||
							(apply_to == "ymin" && y_at == "min") || (apply_to == "ymax" && y_at == "max") ||
							(apply_to == "zmin" && z_at == "min") || (apply_to == "zmax" && z_at == "max")
						) {
							sphere(r = radius);
						} else {
							rotate = 
								(apply_to == "xmin" || apply_to == "xmax" || apply_to == "x") ? [0, 90, 0] : (
								(apply_to == "ymin" || apply_to == "ymax" || apply_to == "y") ? [90, 90, 0] :
								[0, 0, 0]
							);
							rotate(a = rotate)
							cylinder(h = diameter, r = radius, center = true);
						}
					}
				}
			}
		}
	}
}

color("Yellow")
roundedcube(3, true, 0.7, "xmin");

translate(v = [1, 0, 2])
color("Pink")
roundedcube([4, 2, 2], false, 0.6, "zmax");

translate(v = [-4, -1, 2])
color("Lightblue")
roundedcube(2, false);

translate(v = [0, 0, 6])
color("Orange")
roundedcube([3, 2, 2], true, 0.2);

translate(v = [2.5, -0.5, 5])
color("Green")
roundedcube([3, 2, 2], false, 0.4, "z");
